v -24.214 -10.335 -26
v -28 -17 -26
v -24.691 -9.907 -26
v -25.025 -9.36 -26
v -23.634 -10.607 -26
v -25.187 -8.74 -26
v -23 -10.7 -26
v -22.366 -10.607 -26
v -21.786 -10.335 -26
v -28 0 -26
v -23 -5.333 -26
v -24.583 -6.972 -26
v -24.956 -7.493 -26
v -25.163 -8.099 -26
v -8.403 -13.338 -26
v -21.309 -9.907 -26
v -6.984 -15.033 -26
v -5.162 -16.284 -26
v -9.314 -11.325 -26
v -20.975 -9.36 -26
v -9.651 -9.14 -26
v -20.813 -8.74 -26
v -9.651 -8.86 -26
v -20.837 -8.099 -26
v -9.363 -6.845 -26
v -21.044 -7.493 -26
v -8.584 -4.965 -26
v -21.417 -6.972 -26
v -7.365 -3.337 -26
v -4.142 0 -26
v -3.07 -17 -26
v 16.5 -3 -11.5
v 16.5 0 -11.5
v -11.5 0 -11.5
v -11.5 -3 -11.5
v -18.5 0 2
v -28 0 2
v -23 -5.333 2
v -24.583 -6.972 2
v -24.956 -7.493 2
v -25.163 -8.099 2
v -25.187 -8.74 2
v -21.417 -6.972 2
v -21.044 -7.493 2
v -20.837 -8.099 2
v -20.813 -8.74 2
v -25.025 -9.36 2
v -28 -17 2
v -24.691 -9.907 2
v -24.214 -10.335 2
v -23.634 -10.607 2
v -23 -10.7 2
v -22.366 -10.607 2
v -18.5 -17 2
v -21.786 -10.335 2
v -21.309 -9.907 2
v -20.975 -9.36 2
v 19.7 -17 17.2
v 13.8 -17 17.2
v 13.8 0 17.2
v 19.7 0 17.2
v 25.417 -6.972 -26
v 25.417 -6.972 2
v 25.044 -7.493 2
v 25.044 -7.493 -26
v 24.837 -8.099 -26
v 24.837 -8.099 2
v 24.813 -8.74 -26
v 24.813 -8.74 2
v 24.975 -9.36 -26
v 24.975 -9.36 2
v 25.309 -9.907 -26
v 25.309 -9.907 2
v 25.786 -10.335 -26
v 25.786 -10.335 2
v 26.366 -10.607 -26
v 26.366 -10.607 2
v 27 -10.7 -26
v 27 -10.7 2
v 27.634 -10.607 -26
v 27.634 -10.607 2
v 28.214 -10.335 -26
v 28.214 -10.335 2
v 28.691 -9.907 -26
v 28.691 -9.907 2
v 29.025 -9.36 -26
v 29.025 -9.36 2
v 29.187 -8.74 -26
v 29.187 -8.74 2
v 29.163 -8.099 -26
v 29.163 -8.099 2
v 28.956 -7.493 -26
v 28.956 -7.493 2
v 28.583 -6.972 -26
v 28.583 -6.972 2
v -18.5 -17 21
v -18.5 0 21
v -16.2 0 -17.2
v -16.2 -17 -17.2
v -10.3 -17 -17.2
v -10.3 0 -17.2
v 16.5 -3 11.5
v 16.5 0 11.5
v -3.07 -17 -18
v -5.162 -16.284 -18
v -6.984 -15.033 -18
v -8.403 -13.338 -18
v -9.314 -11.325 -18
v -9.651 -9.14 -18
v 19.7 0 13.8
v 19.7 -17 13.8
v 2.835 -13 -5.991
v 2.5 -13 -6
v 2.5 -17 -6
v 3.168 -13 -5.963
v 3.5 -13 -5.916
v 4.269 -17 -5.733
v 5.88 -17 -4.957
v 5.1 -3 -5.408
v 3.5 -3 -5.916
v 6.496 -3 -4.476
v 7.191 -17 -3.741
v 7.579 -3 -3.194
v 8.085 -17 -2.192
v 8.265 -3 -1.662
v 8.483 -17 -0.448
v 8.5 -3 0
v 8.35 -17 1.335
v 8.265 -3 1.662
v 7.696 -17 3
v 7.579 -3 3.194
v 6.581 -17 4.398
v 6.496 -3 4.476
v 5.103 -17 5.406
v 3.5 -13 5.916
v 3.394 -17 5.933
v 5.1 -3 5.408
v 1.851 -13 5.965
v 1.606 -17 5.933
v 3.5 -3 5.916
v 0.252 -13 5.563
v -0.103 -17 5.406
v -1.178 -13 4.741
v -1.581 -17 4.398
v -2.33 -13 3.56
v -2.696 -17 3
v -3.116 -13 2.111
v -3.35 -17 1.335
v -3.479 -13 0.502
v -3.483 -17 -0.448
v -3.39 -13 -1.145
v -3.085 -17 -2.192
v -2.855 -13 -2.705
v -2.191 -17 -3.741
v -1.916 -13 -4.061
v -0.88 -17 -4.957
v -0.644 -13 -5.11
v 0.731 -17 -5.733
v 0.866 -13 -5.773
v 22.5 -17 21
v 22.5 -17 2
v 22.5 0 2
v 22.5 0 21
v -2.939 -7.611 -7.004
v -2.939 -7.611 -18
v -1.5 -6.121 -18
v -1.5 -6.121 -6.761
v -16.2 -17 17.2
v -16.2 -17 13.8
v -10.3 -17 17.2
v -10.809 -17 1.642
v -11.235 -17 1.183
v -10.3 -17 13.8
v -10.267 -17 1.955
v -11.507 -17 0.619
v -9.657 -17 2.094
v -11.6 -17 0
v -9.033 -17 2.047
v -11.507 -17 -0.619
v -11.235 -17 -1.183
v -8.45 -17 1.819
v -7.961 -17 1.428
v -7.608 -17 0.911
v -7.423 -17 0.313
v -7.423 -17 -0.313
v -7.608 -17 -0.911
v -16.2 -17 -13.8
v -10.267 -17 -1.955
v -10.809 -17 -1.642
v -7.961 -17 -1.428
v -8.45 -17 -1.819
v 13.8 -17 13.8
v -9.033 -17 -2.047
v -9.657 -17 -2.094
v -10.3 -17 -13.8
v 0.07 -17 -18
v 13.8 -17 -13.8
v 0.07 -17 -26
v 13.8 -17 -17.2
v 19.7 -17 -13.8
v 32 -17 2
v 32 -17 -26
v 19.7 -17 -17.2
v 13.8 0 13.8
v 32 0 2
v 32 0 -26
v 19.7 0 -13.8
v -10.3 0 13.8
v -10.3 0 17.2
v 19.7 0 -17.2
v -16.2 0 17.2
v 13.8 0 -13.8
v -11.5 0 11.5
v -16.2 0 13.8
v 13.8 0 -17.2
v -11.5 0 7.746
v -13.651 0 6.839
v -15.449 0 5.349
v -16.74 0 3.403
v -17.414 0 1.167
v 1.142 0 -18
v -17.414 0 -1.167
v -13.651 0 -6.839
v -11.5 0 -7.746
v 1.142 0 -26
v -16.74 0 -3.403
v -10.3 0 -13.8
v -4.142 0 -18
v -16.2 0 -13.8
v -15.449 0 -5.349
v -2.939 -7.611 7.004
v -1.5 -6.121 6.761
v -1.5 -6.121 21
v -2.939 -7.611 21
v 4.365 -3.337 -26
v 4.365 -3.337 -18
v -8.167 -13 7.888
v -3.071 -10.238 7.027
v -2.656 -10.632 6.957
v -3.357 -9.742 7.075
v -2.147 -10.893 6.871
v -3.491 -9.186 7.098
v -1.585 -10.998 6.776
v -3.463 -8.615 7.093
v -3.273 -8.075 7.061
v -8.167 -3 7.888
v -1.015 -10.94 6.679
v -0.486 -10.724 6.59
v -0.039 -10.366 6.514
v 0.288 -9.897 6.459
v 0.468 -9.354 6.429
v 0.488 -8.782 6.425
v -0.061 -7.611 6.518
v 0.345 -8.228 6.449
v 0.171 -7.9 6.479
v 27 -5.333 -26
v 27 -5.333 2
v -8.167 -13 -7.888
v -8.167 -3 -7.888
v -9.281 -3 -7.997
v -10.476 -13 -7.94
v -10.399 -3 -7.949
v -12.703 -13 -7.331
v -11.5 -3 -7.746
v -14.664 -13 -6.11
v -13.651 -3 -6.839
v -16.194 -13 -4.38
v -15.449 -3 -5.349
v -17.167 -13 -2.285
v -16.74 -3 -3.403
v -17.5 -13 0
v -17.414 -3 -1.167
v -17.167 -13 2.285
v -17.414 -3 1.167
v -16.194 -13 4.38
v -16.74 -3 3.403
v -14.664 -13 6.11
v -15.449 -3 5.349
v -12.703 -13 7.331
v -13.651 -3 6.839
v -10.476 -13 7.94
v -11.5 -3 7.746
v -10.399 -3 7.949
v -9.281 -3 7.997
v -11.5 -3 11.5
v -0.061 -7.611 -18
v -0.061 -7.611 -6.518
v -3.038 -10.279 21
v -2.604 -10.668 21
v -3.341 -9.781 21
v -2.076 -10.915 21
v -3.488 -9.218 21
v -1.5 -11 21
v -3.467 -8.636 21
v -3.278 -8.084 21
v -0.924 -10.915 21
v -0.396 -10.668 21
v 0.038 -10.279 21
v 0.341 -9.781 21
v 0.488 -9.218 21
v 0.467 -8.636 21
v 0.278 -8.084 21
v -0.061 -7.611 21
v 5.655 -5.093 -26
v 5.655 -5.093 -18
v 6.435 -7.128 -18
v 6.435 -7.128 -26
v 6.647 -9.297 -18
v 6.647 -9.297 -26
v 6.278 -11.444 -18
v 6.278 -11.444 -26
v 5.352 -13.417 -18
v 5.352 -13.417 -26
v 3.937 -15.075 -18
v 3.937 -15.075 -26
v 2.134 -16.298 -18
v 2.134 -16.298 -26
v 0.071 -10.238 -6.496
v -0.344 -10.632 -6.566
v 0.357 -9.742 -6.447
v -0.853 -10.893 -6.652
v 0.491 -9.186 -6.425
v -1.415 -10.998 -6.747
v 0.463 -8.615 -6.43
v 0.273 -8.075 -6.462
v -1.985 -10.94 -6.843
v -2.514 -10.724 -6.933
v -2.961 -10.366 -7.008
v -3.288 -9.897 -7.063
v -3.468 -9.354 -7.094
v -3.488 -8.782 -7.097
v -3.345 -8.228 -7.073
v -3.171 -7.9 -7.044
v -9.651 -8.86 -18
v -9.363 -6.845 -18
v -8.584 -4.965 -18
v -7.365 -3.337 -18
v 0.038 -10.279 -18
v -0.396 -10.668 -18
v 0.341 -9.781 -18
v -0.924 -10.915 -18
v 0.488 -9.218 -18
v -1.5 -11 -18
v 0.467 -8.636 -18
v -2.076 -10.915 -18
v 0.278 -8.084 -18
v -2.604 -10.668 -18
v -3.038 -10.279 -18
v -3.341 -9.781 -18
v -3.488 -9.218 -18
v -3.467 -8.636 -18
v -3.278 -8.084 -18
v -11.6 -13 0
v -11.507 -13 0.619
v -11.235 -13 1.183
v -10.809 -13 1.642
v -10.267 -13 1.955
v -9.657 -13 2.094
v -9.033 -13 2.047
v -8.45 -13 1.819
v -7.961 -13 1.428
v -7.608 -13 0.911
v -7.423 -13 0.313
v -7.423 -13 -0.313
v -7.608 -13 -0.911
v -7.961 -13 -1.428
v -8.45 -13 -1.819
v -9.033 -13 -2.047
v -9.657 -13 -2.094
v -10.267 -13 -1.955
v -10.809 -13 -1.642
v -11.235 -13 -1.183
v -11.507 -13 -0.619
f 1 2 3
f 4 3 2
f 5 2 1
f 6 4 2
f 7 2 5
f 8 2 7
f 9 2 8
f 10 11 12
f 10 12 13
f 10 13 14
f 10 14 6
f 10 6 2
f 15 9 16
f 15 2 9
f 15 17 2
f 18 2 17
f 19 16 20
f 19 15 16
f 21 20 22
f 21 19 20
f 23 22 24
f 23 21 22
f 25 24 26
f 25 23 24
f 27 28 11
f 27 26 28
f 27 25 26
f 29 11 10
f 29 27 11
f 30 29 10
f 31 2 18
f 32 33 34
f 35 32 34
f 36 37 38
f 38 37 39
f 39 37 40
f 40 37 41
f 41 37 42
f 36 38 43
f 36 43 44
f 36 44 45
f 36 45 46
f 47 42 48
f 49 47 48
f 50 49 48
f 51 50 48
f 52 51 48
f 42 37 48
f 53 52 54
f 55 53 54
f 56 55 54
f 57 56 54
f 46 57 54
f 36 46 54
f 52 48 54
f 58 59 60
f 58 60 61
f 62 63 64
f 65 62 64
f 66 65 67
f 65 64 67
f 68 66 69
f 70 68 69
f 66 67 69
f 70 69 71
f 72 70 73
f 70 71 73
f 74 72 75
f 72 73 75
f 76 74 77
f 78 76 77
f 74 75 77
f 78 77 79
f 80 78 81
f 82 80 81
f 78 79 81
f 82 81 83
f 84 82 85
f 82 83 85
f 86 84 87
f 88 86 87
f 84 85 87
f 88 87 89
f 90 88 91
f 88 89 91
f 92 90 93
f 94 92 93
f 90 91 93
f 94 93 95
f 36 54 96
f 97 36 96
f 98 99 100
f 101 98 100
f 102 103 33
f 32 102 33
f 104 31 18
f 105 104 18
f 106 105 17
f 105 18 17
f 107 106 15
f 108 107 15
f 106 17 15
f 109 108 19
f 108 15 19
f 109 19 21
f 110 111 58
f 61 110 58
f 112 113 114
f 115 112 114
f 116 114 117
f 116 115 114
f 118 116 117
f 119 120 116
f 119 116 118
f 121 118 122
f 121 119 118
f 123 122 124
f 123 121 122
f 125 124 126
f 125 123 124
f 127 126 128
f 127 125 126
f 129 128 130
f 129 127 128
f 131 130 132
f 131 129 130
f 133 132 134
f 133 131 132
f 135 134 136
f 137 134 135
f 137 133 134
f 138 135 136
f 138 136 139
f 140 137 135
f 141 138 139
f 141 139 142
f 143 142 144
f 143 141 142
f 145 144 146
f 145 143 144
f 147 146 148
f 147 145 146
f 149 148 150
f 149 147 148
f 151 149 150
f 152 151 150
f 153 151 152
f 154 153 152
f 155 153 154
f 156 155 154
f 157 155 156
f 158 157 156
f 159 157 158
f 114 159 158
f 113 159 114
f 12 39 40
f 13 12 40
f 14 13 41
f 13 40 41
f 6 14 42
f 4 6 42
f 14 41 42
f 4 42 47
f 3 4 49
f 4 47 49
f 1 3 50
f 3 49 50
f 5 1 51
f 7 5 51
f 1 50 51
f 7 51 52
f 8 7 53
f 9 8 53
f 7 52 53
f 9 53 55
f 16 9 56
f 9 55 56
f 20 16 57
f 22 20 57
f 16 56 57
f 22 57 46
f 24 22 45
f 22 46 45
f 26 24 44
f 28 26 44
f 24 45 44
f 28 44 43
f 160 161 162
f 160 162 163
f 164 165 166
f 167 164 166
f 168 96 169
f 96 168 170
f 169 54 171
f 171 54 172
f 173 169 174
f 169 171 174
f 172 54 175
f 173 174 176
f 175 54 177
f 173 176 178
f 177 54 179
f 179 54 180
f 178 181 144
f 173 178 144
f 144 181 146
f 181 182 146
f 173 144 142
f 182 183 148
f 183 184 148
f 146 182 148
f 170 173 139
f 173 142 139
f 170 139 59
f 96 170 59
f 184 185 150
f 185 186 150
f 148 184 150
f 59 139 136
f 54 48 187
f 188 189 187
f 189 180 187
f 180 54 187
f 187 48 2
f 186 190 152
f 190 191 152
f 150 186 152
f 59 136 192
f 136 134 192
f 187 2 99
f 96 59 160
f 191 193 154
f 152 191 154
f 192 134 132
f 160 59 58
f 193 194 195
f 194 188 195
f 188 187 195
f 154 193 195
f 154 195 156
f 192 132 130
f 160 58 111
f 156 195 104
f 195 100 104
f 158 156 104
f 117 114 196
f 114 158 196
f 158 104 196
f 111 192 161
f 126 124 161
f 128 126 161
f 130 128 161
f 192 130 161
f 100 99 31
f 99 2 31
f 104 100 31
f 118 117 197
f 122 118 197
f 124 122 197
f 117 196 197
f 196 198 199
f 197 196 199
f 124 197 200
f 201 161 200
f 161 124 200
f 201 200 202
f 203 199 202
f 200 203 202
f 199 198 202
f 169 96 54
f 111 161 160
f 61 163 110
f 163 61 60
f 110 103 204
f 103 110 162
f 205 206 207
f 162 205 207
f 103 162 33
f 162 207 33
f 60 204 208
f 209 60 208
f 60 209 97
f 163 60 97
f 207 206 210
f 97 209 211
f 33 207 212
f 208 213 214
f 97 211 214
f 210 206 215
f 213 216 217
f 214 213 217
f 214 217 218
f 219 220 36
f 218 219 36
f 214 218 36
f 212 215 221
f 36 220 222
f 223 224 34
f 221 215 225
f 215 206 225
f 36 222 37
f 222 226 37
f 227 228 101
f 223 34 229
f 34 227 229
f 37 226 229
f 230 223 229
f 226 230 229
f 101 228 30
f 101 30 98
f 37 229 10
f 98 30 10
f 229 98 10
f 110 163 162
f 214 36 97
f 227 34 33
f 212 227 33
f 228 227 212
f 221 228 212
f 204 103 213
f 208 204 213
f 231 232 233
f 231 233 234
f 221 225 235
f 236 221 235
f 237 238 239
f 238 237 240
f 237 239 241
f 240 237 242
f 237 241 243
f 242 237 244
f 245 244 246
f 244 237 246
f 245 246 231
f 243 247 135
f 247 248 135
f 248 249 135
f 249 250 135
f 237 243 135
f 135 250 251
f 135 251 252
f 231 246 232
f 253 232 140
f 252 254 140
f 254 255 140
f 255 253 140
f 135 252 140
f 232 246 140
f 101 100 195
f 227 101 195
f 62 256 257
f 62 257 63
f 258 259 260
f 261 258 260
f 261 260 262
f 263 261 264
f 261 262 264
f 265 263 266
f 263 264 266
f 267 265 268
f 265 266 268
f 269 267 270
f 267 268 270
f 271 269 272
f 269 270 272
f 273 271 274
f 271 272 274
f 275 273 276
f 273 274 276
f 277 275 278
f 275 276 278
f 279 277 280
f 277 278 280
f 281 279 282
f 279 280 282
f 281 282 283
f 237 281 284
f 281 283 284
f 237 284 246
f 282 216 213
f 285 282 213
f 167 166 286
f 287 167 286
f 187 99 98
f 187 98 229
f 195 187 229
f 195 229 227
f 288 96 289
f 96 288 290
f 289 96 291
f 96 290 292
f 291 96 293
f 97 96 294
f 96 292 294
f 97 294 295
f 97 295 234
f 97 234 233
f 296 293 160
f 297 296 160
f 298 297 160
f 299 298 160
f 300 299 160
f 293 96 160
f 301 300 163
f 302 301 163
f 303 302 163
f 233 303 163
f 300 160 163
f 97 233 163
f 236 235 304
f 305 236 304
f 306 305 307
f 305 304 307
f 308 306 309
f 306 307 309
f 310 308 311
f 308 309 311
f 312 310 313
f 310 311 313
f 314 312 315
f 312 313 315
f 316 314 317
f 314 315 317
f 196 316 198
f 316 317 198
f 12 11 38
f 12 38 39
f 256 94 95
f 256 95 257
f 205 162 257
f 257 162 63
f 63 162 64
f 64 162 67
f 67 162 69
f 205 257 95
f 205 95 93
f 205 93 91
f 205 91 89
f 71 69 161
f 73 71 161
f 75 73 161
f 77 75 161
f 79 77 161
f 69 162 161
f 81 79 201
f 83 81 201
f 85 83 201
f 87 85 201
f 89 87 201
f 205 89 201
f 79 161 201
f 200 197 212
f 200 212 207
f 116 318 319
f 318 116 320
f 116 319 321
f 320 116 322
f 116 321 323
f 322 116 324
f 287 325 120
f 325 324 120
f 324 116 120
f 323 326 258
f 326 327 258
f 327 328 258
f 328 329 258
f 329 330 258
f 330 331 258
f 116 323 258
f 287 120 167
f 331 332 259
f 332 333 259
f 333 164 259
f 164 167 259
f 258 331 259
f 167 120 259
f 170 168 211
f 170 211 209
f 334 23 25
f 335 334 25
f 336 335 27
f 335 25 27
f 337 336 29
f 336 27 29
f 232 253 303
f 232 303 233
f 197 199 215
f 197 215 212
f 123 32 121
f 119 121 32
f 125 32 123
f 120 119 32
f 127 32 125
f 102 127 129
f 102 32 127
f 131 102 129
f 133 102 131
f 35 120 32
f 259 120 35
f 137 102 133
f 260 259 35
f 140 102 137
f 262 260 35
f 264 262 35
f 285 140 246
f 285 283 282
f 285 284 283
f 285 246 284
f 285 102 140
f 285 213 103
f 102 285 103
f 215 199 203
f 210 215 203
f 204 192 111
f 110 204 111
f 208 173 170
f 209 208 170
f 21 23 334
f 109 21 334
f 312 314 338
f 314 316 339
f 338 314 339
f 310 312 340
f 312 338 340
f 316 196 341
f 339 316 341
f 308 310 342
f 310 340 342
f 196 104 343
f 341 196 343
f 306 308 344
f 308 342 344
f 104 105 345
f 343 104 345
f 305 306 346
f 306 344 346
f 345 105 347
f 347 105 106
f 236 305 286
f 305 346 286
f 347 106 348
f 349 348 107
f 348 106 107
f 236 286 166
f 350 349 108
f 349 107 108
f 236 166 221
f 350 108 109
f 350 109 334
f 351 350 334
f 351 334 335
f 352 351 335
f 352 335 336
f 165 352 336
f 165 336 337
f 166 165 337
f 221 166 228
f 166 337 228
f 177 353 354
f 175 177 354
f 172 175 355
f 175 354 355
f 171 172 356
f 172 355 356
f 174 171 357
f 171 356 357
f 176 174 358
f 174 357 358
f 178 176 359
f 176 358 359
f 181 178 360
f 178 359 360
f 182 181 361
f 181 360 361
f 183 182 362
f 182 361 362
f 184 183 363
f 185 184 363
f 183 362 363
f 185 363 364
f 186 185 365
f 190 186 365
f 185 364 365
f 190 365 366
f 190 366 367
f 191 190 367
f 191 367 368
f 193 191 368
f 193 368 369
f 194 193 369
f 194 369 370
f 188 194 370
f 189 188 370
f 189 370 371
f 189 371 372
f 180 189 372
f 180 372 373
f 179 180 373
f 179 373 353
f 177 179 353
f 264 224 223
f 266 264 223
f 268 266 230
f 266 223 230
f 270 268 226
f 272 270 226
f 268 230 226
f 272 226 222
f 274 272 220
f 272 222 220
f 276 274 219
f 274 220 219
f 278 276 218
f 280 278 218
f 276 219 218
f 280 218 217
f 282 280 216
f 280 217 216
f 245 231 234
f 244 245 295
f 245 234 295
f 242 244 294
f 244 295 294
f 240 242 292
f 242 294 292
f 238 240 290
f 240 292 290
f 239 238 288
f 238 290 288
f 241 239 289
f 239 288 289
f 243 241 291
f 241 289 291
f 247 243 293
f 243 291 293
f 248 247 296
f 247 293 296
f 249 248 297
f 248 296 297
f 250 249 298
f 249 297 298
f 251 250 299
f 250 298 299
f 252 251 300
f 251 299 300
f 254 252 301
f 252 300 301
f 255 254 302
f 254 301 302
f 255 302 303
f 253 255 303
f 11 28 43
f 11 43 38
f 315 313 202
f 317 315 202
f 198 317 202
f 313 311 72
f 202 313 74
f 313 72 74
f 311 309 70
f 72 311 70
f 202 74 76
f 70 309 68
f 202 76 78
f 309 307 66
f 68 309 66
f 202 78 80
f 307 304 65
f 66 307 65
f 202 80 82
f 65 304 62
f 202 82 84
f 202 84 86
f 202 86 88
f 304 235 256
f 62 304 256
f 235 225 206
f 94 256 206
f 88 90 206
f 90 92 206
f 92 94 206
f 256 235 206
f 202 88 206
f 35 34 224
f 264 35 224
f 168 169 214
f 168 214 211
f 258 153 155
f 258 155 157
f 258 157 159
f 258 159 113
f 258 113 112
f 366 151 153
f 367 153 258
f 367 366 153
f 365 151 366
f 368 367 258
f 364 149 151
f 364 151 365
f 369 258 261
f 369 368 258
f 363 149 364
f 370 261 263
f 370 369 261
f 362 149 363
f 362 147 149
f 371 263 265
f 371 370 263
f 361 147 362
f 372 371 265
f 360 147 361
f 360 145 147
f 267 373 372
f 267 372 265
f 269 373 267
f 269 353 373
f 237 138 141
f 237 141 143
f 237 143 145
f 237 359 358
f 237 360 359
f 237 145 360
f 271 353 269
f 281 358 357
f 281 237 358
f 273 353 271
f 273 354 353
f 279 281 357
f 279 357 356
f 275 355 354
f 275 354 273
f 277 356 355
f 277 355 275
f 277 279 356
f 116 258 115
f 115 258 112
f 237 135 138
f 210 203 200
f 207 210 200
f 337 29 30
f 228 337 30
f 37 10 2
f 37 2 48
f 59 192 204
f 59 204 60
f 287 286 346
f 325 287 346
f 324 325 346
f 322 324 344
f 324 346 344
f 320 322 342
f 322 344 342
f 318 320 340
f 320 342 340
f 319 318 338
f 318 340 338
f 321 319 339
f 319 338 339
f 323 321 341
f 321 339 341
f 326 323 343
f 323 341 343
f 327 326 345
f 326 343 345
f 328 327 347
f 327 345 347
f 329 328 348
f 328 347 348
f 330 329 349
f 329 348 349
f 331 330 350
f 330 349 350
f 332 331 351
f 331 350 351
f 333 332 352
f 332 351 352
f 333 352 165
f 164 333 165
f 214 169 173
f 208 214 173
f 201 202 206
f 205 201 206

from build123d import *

# Parameters (mm, degrees)
SKETCH1_W           = 17
SKETCH1_H           = 47
BOSS_EXTRUDE1_DEPTH = 6.581097747
CUT_EXTRUDE1_DEPTH  = 8
BOSS_EXTRUDE2_START = 8
BOSS_EXTRUDE2_DEPTH = 8
SKETCH4_W           = 39
SKETCH4_H           = 17
BOSS_EXTRUDE3_DEPTH = 35.070363466
SKETCH5_W           = 47
SKETCH5_H           = 17
BOSS_EXTRUDE4_DEPTH = 18.348538787
BOSS_EXTRUDE5_START = 8
BOSS_EXTRUDE5_DEPTH = 8
CUT_EXTRUDE2_DEPTH  = 3
CUT_EXTRUDE3_DEPTH  = 10
SKETCH9_W           = 9.5
SKETCH9_H           = 19
CUT_EXTRUDE4_DEPTH  = 45.598206242
SKETCH10_W          = 9.5
SKETCH10_H          = 19
CUT_EXTRUDE5_DEPTH  = 45.598206242
SKETCH11_W          = 5.9
SKETCH11_H          = 3.4
CUT_EXTRUDE6_DEPTH  = 45.598206242
SKETCH12_W          = 5.9
SKETCH12_H          = 3.4
CUT_EXTRUDE7_DEPTH  = 45.598206242
SKETCH13_W          = 5.9
SKETCH13_H          = 3.4
CUT_EXTRUDE8_DEPTH  = 45.598206242
CUT_EXTRUDE9_REACH  = 61.346
CUT_EXTRUDE10_DEPTH = 46.793012567
CUT_EXTRUDE11_DEPTH = 46.793012567
SKETCH17_W          = 5.9
SKETCH17_H          = 3.4
CUT_EXTRUDE12_DEPTH = 45.598206242
CUT_EXTRUDE13_REACH = 55.235
SKETCH19_W          = 6
SKETCH19_H          = 14
HOLE1_D             = 4.2
HOLE1_DEPTH         = 17.000025


with BuildPart() as part:
    # Sketch1 → Boss-Extrude1 (new body)
    with BuildSketch(Plane(origin=(-9.651461213, 0, 0), x_dir=(0, -1, 0), z_dir=(-1, 0, 0))):
        with Locations((8.5, -2.5)):
            Rectangle(SKETCH1_W, SKETCH1_H)
    extrude(amount=-BOSS_EXTRUDE1_DEPTH)

    # Sketch2 → Cut-Extrude1 (cut)
    with BuildSketch(Plane(origin=(0, 0, -26), x_dir=(-1, 0, 0), z_dir=(0, 0, -1))):
        with BuildLine():
            Line((3.070363466, 0), (3.070363466, -17))
            Line((3.070363466, -17), (9.651461213, -17))
            Line((9.651461213, -17), (9.651461213, -8.859566716))
            ThreePointArc((9.651461213, -8.859566716), (9.032439772, -5.88096289), (7.364540596, -3.336678977))
            Line((7.364540596, -3.336678977), (4.142347163, 0))
            Line((4.142347163, 0), (3.070363466, 0))
        make_face()
    extrude(amount=-CUT_EXTRUDE1_DEPTH, mode=Mode.SUBTRACT)

    # Sketch3 → Boss-Extrude2 (add)
    with BuildSketch(Plane(origin=(0, 0, -18), x_dir=(-1, 0, 0), z_dir=(0, 0, -1)).offset(BOSS_EXTRUDE2_START)):
        with BuildLine():
            Line((9.651461213, -9.140433284), (9.651461213, -17))
            Line((9.651461213, -17), (3.070363466, -17))
            ThreePointArc((3.070363466, -17), (7.750733238, -14.233963642), (9.651461213, -9.140433284))
        make_face()
    extrude(amount=-BOSS_EXTRUDE2_DEPTH)

    # Sketch4 → Boss-Extrude3 (add)
    with BuildSketch(Plane(origin=(-3.070363466, 0, 0), x_dir=(0, 0, -1), z_dir=(1, 0, 0))):
        with Locations((-1.5, -8.5)):
            Rectangle(SKETCH4_W, SKETCH4_H)
    extrude(amount=BOSS_EXTRUDE3_DEPTH)

    # Sketch5 → Boss-Extrude4 (add)
    with BuildSketch(Plane.ZY.offset(9.651461213)):
        with Locations((-2.5, -8.5)):
            Rectangle(SKETCH5_W, SKETCH5_H)
    extrude(amount=BOSS_EXTRUDE4_DEPTH)

    # Sketch6 → Boss-Extrude5 (add)
    with BuildSketch(Plane(origin=(0, 0, -18), x_dir=(-1, 0, 0), z_dir=(0, 0, -1)).offset(BOSS_EXTRUDE5_START)):
        with BuildLine():
            Line((-32, -17), (-32, 0))
            Line((-32, 0), (-1.142347163, 0))
            Line((-1.142347163, 0), (-4.364540596, -3.336678977))
            ThreePointArc((-4.364540596, -3.336678977), (-6.277598276, -11.444382635), (-0.070363466, -17))
            Line((-0.070363466, -17), (-32, -17))
        make_face()
    extrude(amount=-BOSS_EXTRUDE5_DEPTH)

    # Sketch7 → Cut-Extrude2 (cut)
    with BuildSketch(Plane(origin=(0, 0, 0), x_dir=(-1, 0, 0), z_dir=(0, 1, 0))):
        with BuildLine():
            Line((11.5, -11.5), (11.5, -7.745966692))
            ThreePointArc((11.5, -7.745966692), (17.5, 0), (11.5, 7.745966692))
            Line((11.5, 7.745966692), (11.5, 11.5))
            Line((11.5, 11.5), (-16.5, 11.5))
            Line((-16.5, 11.5), (-16.5, -11.5))
            Line((-16.5, -11.5), (11.5, -11.5))
        make_face()
    extrude(amount=-CUT_EXTRUDE2_DEPTH, mode=Mode.SUBTRACT)

    # Sketch8 → Cut-Extrude3 (cut)
    with BuildSketch(Plane(origin=(0, -3, 0), x_dir=(-1, 0, 0), z_dir=(0, 1, 0))):
        with BuildLine():
            Line((-3.5, -5.916079783), (8.166666667, -7.888106377))
            ThreePointArc((8.166666667, -7.888106377), (17.5, 0), (8.166666667, 7.888106377))
            Line((8.166666667, 7.888106377), (-3.5, 5.916079783))
            ThreePointArc((-3.5, 5.916079783), (3.5, 0), (-3.5, -5.916079783))
        make_face()
    extrude(amount=-CUT_EXTRUDE3_DEPTH, mode=Mode.SUBTRACT)

    # Sketch9 → Cut-Extrude4 (cut, through all)
    with BuildSketch(Plane.XZ.offset(17)):
        with Locations((27.25, 11.5)):
            Rectangle(SKETCH9_W, SKETCH9_H)
    extrude(amount=-CUT_EXTRUDE4_DEPTH, mode=Mode.SUBTRACT)

    # Sketch10 → Cut-Extrude5 (cut, through all)
    with BuildSketch(Plane.XZ.offset(17)):
        with Locations((-23.25, 11.5)):
            Rectangle(SKETCH10_W, SKETCH10_H)
    extrude(amount=-CUT_EXTRUDE5_DEPTH, mode=Mode.SUBTRACT)

    # Sketch11 → Cut-Extrude6 (cut, through all)
    with BuildSketch(Plane.XZ.offset(17)):
        with Locations((-13.25, 15.5)):
            Rectangle(SKETCH11_W, SKETCH11_H)
    extrude(amount=-CUT_EXTRUDE6_DEPTH, mode=Mode.SUBTRACT)

    # Sketch12 → Cut-Extrude7 (cut, through all)
    with BuildSketch(Plane.XZ.offset(17)):
        with Locations((16.75, 15.5)):
            Rectangle(SKETCH12_W, SKETCH12_H)
    extrude(amount=-CUT_EXTRUDE7_DEPTH, mode=Mode.SUBTRACT)

    # Sketch13 → Cut-Extrude8 (cut, through all)
    with BuildSketch(Plane.XZ.offset(17)):
        with Locations((16.75, -15.5)):
            Rectangle(SKETCH13_W, SKETCH13_H)
    extrude(amount=-CUT_EXTRUDE8_DEPTH, mode=Mode.SUBTRACT)

    # Cut-Extrude9: up to this plane
    cut_extrude9_end = Plane(origin=(-8.166666667, -13, 7.888106377), z_dir=(0.16666666666666724, 0, 0.9860132971832694))
    # Sketch14 → Cut-Extrude9 (cut, up to the surface)
    with BuildSketch(Plane.XY.offset(21), mode=Mode.PRIVATE) as cut_extrude9_sk1:
        with BuildLine():
            Line((-0.061320399, -7.610683259), (-1.5, -6.120886921))
            Line((-1.5, -6.120886921), (-2.938679601, -7.610683259))
            ThreePointArc((-2.938679601, -7.610683259), (-1.5, -11), (-0.061320399, -7.610683259))
        make_face()
    cut_extrude9_tool1 = split(extrude(cut_extrude9_sk1.sketch, amount=-CUT_EXTRUDE9_REACH, mode=Mode.PRIVATE), bisect_by=cut_extrude9_end, keep=Keep.BOTH, mode=Mode.PRIVATE)
    add(cut_extrude9_tool1.solids().sort_by_distance((-1.5, -8.847599, 21))[0], mode=Mode.SUBTRACT)

    # Sketch15 → Cut-Extrude10 (cut, through all)
    with BuildSketch(Plane.XY.offset(2)):
        with BuildLine():
            Line((-21.417452439, -6.971751585), (-23, -5.332975613))
            Line((-23, -5.332975613), (-24.582547561, -6.971751585))
            ThreePointArc((-24.582547561, -6.971751585), (-23, -10.7), (-21.417452439, -6.971751585))
        make_face()
    extrude(amount=-CUT_EXTRUDE10_DEPTH, mode=Mode.SUBTRACT)

    # Sketch16 → Cut-Extrude11 (cut, through all)
    with BuildSketch(Plane.XY.offset(2)):
        with BuildLine():
            Line((28.582547561, -6.971751585), (27, -5.332975613))
            Line((27, -5.332975613), (25.417452439, -6.971751585))
            ThreePointArc((25.417452439, -6.971751585), (27, -10.7), (28.582547561, -6.971751585))
        make_face()
    extrude(amount=-CUT_EXTRUDE11_DEPTH, mode=Mode.SUBTRACT)

    # Sketch17 → Cut-Extrude12 (cut, through all)
    with BuildSketch(Plane.XZ.offset(17)):
        with Locations((-13.25, -15.5)):
            Rectangle(SKETCH17_W, SKETCH17_H)
    extrude(amount=-CUT_EXTRUDE12_DEPTH, mode=Mode.SUBTRACT)

    # Cut-Extrude13: up to this plane
    cut_extrude13_end = Plane(origin=(3.5, -13, -5.916079783), z_dir=(0.1666666666666663, 0, -0.9860132971832695))
    # Sketch18 → Cut-Extrude13 (cut, up to the surface)
    with BuildSketch(Plane(origin=(0, 0, -18), x_dir=(-1, 0, 0), z_dir=(0, 0, -1)), mode=Mode.PRIVATE) as cut_extrude13_sk1:
        with BuildLine():
            Line((1.5, -6.120886921), (0.061320399, -7.610683259))
            ThreePointArc((0.061320399, -7.610683259), (1.5, -11), (2.938679601, -7.610683259))
            Line((2.938679601, -7.610683259), (1.5, -6.120886921))
        make_face()
    cut_extrude13_tool1 = split(extrude(cut_extrude13_sk1.sketch, amount=-CUT_EXTRUDE13_REACH, mode=Mode.PRIVATE), bisect_by=cut_extrude13_end, keep=Keep.BOTH, mode=Mode.PRIVATE)
    add(cut_extrude13_tool1.solids().sort_by_distance((-1.5, -8.847599, -18))[0], mode=Mode.SUBTRACT)

    # Sketch19 → Cut-Revolve1 (revolve, cut)
    with BuildSketch(Plane.XY, mode=Mode.PRIVATE) as cut_revolve1_sk:
        with Locations((5.5, -10)):
            Rectangle(SKETCH19_W, SKETCH19_H)
    revolve(cut_revolve1_sk.sketch.rotate(Axis((2.5, -3, 0), (0, -1, 0)), 270), axis=Axis((2.5, -3, 0), (0, -1, 0)), mode=Mode.SUBTRACT)

    # Hole1
    with Locations(Plane.XZ.offset(17)):
        with Locations((-9.5, 0)):
            Hole(HOLE1_D / 2, depth=HOLE1_DEPTH)


solid = part.part
